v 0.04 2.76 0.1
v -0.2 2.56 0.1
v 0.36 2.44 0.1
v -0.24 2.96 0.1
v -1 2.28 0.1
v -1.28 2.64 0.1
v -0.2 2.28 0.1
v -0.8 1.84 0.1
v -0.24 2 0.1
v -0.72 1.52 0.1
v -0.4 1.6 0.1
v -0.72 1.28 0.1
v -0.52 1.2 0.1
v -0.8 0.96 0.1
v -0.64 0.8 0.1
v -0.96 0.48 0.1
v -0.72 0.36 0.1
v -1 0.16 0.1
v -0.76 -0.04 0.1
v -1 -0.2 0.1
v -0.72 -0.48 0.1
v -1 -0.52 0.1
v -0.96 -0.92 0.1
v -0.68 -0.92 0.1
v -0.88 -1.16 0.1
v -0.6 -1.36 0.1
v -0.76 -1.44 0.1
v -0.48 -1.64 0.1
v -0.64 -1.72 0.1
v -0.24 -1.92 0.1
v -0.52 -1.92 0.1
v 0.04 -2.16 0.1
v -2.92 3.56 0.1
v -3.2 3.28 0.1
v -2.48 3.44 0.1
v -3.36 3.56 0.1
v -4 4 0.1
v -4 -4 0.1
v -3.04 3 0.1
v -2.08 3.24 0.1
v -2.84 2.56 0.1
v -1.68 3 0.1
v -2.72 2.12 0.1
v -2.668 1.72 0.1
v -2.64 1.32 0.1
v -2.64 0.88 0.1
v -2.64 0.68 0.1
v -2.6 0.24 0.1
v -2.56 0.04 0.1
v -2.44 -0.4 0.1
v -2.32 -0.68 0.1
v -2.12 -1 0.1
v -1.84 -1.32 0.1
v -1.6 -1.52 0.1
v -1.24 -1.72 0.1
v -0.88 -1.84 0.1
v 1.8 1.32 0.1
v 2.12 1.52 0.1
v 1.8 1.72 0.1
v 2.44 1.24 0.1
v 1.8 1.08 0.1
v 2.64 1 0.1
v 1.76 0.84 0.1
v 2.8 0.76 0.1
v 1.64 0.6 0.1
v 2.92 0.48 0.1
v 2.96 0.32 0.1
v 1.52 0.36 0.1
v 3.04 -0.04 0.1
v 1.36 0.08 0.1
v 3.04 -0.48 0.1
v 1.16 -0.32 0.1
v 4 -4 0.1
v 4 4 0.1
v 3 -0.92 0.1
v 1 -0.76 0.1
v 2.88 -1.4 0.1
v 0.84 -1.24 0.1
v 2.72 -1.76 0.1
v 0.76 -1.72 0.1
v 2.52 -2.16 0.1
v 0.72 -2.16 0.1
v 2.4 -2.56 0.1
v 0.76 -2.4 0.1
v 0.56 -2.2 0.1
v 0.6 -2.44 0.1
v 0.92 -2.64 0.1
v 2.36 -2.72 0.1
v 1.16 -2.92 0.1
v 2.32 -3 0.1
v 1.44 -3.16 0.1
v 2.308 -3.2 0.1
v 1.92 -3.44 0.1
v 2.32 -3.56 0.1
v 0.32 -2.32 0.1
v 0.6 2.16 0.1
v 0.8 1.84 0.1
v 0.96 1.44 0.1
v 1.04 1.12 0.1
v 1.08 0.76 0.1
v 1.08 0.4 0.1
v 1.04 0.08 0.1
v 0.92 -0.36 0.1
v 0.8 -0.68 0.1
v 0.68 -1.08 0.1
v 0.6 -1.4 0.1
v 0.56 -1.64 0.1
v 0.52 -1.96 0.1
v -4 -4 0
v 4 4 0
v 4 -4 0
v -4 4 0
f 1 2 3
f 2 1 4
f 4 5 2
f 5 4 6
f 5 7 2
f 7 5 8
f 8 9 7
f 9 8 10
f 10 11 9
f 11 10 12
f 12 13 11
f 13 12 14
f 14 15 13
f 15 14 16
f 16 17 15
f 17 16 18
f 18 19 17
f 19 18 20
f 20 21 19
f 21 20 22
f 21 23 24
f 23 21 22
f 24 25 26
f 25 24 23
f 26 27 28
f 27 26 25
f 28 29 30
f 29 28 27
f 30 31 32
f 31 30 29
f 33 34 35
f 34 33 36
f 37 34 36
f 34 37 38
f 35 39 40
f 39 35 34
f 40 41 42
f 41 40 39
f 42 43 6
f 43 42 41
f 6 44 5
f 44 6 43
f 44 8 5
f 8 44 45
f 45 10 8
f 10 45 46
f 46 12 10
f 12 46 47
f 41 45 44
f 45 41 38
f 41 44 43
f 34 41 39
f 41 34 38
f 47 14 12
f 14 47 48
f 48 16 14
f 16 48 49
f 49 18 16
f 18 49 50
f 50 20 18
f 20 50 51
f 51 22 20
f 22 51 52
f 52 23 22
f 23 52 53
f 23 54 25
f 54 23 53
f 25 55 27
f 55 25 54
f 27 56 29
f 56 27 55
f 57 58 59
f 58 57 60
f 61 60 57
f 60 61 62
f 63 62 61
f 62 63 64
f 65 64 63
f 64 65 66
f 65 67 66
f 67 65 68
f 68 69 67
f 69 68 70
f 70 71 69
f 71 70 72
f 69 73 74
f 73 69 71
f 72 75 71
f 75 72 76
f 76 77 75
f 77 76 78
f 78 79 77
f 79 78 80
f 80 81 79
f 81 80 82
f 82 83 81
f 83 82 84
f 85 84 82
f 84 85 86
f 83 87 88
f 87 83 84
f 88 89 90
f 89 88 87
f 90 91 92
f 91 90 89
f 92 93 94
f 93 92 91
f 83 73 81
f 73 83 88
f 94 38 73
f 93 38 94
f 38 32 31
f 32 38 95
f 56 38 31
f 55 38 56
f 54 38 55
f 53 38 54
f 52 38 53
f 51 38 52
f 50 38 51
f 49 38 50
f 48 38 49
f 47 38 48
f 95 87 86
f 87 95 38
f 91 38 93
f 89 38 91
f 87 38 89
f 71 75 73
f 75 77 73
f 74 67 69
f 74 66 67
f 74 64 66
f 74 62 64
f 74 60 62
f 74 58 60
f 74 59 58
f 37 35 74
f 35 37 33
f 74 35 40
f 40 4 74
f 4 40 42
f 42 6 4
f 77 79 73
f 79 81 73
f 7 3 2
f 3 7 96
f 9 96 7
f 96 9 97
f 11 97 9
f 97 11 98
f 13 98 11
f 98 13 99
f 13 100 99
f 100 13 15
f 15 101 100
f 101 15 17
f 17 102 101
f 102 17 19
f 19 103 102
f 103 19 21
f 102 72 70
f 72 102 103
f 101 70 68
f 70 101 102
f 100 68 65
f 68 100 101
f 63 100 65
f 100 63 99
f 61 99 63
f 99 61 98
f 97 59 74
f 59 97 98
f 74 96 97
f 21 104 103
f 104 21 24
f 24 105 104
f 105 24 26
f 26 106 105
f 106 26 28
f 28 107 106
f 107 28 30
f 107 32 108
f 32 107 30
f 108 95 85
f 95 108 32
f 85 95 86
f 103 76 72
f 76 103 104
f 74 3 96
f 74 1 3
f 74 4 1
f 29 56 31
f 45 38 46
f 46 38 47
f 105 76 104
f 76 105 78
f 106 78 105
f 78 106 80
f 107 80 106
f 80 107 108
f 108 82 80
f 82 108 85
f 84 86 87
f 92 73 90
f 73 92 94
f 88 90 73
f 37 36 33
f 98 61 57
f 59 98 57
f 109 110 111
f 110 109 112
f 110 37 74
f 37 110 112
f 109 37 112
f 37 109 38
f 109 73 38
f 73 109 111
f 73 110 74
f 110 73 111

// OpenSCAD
// file: ../p/box5-12.scad
use <../lib.scad>
function ldraw_lib__box5_12() = [
// 0 Box with 5 Faces without Any Edges
// 0 Name: box5-12.dat
// 0 Author: Chris Dee [cwdee]
// 0 !LDRAW_ORG Primitive UPDATE 2009-02
// 0 !LICENSE Licensed under CC BY 2.0 and CC BY 4.0 : see CAreadme.txt
// 
// 0 BFC CERTIFY CCW
  [0,"BFC","CERTIFY"],
  [0,"BFC","CCW"],
// 
// 0 !HISTORY 2009-09-03 [PTadmin] Official Update 2009-02
// 
// 
// 4 16 1 1 1 1 1 -1 -1 1 -1 -1 1 1
  [4,16,1,1,1,1,1,-1,-1,1,-1,-1,1,1],
// 4 16 -1 0 1 1 0 1 1 1 1 -1 1 1
  [4,16,-1,0,1,1,0,1,1,1,1,-1,1,1],
// 4 16 -1 0 -1 -1 0 1 -1 1 1 -1 1 -1
  [4,16,-1,0,-1,-1,0,1,-1,1,1,-1,1,-1],
// 4 16 1 0 -1 -1 0 -1 -1 1 -1 1 1 -1
  [4,16,1,0,-1,-1,0,-1,-1,1,-1,1,1,-1],
// 4 16 1 0 1 1 0 -1 1 1 -1 1 1 1
  [4,16,1,0,1,1,0,-1,1,1,-1,1,1,1],
// 0
];
module ldraw_lib__box5_12(step=0, col=false, unit=2/5, alt=false, line=0.2, solid=!$preview)
    makepoly(ldraw_lib__box5_12(), step=step, col=col, unit=unit, alt=alt, line=line, solid=solid);
ldraw_lib__box5_12(line=0.2);
// file: 004659a.scad
use <../lib.scad>
use <../p/box5-12.scad>
use <s/004659as01.scad>
function ldraw_lib__004659a() = [
// 0 Sticker  1 x  1 Fire Emblem
// 0 Name: 004659a.dat
// 0 Author: Alex Taylor [anathema]
// 0 !LDRAW_ORG Part UPDATE 2013-01
// 0 !LICENSE Licensed under CC BY 2.0 and CC BY 4.0 : see CAreadme.txt
// 
// 0 BFC CERTIFY CCW
  [0,"BFC","CERTIFY"],
  [0,"BFC","CCW"],
// 
// 0 !HISTORY 2013-03-17 [MagFors] Used box primitive
// 0 !HISTORY 2013-07-21 [PTadmin] Official Update 2013-01
// 
// 
// 1 16 0 -0.25 0 1 0 0 0 1 0 0 0 1 s\004659as01.dat
  [1,16,0,-0.25,0,1,0,0,0,1,0,0,0,1, ldraw_lib__s__004659as01()],
// 1 16 0 -0.25 0 10 0 0 0 0.25 0 0 0 10 box5-12.dat
  [1,16,0,-0.25,0,10,0,0,0,0.25,0,0,0,10, ldraw_lib__box5_12()],
];
module ldraw_lib__004659a(step=0, col=false, unit=2/5, alt=false, line=0.2, solid=!$preview)
    makepoly(ldraw_lib__004659a(), step=step, col=col, unit=unit, alt=alt, line=line, solid=solid);
ldraw_lib__004659a(line=0.2);
// main file
use <../lib.scad>
use <004659a.scad>
function ldraw_lib__004608b() = [
// 0 =Sticker  1 x  1 Fire Emblem
// 0 Name: 004608b.dat
// 0 Author: [PTadmin]
// 0 !LDRAW_ORG Part Alias UPDATE 2013-02
// 0 !LICENSE Licensed under CC BY 4.0 : see CAreadme.txt
// 
// 0 BFC CERTIFY CW
  [0,"BFC","CERTIFY"],
  [0,"BFC","CW"],
// 
// 0 !HISTORY 2013-07-21 [PTadmin] Official Update 2013-01
// 0 !HISTORY 2013-12-14 [cwdee] Add = prefix
// 0 !HISTORY 2013-12-23 [PTadmin] Official Update 2013-02
// 
// 
// 0 // Alias of 004659a
// 
// 1 16 0 0 0 1 0 0 0 1 0 0 0 1 004659a.dat
  [1,16,0,0,0,1,0,0,0,1,0,0,0,1, ldraw_lib__004659a()],
// 0
];
module ldraw_lib__004608b(step=0, col=false, unit=2/5, alt=false, line=0.2, solid=!$preview)
    makepoly(ldraw_lib__004608b(), step=step, col=col, unit=unit, alt=alt, line=line, solid=solid);
ldraw_lib__004608b(line=0.2);
